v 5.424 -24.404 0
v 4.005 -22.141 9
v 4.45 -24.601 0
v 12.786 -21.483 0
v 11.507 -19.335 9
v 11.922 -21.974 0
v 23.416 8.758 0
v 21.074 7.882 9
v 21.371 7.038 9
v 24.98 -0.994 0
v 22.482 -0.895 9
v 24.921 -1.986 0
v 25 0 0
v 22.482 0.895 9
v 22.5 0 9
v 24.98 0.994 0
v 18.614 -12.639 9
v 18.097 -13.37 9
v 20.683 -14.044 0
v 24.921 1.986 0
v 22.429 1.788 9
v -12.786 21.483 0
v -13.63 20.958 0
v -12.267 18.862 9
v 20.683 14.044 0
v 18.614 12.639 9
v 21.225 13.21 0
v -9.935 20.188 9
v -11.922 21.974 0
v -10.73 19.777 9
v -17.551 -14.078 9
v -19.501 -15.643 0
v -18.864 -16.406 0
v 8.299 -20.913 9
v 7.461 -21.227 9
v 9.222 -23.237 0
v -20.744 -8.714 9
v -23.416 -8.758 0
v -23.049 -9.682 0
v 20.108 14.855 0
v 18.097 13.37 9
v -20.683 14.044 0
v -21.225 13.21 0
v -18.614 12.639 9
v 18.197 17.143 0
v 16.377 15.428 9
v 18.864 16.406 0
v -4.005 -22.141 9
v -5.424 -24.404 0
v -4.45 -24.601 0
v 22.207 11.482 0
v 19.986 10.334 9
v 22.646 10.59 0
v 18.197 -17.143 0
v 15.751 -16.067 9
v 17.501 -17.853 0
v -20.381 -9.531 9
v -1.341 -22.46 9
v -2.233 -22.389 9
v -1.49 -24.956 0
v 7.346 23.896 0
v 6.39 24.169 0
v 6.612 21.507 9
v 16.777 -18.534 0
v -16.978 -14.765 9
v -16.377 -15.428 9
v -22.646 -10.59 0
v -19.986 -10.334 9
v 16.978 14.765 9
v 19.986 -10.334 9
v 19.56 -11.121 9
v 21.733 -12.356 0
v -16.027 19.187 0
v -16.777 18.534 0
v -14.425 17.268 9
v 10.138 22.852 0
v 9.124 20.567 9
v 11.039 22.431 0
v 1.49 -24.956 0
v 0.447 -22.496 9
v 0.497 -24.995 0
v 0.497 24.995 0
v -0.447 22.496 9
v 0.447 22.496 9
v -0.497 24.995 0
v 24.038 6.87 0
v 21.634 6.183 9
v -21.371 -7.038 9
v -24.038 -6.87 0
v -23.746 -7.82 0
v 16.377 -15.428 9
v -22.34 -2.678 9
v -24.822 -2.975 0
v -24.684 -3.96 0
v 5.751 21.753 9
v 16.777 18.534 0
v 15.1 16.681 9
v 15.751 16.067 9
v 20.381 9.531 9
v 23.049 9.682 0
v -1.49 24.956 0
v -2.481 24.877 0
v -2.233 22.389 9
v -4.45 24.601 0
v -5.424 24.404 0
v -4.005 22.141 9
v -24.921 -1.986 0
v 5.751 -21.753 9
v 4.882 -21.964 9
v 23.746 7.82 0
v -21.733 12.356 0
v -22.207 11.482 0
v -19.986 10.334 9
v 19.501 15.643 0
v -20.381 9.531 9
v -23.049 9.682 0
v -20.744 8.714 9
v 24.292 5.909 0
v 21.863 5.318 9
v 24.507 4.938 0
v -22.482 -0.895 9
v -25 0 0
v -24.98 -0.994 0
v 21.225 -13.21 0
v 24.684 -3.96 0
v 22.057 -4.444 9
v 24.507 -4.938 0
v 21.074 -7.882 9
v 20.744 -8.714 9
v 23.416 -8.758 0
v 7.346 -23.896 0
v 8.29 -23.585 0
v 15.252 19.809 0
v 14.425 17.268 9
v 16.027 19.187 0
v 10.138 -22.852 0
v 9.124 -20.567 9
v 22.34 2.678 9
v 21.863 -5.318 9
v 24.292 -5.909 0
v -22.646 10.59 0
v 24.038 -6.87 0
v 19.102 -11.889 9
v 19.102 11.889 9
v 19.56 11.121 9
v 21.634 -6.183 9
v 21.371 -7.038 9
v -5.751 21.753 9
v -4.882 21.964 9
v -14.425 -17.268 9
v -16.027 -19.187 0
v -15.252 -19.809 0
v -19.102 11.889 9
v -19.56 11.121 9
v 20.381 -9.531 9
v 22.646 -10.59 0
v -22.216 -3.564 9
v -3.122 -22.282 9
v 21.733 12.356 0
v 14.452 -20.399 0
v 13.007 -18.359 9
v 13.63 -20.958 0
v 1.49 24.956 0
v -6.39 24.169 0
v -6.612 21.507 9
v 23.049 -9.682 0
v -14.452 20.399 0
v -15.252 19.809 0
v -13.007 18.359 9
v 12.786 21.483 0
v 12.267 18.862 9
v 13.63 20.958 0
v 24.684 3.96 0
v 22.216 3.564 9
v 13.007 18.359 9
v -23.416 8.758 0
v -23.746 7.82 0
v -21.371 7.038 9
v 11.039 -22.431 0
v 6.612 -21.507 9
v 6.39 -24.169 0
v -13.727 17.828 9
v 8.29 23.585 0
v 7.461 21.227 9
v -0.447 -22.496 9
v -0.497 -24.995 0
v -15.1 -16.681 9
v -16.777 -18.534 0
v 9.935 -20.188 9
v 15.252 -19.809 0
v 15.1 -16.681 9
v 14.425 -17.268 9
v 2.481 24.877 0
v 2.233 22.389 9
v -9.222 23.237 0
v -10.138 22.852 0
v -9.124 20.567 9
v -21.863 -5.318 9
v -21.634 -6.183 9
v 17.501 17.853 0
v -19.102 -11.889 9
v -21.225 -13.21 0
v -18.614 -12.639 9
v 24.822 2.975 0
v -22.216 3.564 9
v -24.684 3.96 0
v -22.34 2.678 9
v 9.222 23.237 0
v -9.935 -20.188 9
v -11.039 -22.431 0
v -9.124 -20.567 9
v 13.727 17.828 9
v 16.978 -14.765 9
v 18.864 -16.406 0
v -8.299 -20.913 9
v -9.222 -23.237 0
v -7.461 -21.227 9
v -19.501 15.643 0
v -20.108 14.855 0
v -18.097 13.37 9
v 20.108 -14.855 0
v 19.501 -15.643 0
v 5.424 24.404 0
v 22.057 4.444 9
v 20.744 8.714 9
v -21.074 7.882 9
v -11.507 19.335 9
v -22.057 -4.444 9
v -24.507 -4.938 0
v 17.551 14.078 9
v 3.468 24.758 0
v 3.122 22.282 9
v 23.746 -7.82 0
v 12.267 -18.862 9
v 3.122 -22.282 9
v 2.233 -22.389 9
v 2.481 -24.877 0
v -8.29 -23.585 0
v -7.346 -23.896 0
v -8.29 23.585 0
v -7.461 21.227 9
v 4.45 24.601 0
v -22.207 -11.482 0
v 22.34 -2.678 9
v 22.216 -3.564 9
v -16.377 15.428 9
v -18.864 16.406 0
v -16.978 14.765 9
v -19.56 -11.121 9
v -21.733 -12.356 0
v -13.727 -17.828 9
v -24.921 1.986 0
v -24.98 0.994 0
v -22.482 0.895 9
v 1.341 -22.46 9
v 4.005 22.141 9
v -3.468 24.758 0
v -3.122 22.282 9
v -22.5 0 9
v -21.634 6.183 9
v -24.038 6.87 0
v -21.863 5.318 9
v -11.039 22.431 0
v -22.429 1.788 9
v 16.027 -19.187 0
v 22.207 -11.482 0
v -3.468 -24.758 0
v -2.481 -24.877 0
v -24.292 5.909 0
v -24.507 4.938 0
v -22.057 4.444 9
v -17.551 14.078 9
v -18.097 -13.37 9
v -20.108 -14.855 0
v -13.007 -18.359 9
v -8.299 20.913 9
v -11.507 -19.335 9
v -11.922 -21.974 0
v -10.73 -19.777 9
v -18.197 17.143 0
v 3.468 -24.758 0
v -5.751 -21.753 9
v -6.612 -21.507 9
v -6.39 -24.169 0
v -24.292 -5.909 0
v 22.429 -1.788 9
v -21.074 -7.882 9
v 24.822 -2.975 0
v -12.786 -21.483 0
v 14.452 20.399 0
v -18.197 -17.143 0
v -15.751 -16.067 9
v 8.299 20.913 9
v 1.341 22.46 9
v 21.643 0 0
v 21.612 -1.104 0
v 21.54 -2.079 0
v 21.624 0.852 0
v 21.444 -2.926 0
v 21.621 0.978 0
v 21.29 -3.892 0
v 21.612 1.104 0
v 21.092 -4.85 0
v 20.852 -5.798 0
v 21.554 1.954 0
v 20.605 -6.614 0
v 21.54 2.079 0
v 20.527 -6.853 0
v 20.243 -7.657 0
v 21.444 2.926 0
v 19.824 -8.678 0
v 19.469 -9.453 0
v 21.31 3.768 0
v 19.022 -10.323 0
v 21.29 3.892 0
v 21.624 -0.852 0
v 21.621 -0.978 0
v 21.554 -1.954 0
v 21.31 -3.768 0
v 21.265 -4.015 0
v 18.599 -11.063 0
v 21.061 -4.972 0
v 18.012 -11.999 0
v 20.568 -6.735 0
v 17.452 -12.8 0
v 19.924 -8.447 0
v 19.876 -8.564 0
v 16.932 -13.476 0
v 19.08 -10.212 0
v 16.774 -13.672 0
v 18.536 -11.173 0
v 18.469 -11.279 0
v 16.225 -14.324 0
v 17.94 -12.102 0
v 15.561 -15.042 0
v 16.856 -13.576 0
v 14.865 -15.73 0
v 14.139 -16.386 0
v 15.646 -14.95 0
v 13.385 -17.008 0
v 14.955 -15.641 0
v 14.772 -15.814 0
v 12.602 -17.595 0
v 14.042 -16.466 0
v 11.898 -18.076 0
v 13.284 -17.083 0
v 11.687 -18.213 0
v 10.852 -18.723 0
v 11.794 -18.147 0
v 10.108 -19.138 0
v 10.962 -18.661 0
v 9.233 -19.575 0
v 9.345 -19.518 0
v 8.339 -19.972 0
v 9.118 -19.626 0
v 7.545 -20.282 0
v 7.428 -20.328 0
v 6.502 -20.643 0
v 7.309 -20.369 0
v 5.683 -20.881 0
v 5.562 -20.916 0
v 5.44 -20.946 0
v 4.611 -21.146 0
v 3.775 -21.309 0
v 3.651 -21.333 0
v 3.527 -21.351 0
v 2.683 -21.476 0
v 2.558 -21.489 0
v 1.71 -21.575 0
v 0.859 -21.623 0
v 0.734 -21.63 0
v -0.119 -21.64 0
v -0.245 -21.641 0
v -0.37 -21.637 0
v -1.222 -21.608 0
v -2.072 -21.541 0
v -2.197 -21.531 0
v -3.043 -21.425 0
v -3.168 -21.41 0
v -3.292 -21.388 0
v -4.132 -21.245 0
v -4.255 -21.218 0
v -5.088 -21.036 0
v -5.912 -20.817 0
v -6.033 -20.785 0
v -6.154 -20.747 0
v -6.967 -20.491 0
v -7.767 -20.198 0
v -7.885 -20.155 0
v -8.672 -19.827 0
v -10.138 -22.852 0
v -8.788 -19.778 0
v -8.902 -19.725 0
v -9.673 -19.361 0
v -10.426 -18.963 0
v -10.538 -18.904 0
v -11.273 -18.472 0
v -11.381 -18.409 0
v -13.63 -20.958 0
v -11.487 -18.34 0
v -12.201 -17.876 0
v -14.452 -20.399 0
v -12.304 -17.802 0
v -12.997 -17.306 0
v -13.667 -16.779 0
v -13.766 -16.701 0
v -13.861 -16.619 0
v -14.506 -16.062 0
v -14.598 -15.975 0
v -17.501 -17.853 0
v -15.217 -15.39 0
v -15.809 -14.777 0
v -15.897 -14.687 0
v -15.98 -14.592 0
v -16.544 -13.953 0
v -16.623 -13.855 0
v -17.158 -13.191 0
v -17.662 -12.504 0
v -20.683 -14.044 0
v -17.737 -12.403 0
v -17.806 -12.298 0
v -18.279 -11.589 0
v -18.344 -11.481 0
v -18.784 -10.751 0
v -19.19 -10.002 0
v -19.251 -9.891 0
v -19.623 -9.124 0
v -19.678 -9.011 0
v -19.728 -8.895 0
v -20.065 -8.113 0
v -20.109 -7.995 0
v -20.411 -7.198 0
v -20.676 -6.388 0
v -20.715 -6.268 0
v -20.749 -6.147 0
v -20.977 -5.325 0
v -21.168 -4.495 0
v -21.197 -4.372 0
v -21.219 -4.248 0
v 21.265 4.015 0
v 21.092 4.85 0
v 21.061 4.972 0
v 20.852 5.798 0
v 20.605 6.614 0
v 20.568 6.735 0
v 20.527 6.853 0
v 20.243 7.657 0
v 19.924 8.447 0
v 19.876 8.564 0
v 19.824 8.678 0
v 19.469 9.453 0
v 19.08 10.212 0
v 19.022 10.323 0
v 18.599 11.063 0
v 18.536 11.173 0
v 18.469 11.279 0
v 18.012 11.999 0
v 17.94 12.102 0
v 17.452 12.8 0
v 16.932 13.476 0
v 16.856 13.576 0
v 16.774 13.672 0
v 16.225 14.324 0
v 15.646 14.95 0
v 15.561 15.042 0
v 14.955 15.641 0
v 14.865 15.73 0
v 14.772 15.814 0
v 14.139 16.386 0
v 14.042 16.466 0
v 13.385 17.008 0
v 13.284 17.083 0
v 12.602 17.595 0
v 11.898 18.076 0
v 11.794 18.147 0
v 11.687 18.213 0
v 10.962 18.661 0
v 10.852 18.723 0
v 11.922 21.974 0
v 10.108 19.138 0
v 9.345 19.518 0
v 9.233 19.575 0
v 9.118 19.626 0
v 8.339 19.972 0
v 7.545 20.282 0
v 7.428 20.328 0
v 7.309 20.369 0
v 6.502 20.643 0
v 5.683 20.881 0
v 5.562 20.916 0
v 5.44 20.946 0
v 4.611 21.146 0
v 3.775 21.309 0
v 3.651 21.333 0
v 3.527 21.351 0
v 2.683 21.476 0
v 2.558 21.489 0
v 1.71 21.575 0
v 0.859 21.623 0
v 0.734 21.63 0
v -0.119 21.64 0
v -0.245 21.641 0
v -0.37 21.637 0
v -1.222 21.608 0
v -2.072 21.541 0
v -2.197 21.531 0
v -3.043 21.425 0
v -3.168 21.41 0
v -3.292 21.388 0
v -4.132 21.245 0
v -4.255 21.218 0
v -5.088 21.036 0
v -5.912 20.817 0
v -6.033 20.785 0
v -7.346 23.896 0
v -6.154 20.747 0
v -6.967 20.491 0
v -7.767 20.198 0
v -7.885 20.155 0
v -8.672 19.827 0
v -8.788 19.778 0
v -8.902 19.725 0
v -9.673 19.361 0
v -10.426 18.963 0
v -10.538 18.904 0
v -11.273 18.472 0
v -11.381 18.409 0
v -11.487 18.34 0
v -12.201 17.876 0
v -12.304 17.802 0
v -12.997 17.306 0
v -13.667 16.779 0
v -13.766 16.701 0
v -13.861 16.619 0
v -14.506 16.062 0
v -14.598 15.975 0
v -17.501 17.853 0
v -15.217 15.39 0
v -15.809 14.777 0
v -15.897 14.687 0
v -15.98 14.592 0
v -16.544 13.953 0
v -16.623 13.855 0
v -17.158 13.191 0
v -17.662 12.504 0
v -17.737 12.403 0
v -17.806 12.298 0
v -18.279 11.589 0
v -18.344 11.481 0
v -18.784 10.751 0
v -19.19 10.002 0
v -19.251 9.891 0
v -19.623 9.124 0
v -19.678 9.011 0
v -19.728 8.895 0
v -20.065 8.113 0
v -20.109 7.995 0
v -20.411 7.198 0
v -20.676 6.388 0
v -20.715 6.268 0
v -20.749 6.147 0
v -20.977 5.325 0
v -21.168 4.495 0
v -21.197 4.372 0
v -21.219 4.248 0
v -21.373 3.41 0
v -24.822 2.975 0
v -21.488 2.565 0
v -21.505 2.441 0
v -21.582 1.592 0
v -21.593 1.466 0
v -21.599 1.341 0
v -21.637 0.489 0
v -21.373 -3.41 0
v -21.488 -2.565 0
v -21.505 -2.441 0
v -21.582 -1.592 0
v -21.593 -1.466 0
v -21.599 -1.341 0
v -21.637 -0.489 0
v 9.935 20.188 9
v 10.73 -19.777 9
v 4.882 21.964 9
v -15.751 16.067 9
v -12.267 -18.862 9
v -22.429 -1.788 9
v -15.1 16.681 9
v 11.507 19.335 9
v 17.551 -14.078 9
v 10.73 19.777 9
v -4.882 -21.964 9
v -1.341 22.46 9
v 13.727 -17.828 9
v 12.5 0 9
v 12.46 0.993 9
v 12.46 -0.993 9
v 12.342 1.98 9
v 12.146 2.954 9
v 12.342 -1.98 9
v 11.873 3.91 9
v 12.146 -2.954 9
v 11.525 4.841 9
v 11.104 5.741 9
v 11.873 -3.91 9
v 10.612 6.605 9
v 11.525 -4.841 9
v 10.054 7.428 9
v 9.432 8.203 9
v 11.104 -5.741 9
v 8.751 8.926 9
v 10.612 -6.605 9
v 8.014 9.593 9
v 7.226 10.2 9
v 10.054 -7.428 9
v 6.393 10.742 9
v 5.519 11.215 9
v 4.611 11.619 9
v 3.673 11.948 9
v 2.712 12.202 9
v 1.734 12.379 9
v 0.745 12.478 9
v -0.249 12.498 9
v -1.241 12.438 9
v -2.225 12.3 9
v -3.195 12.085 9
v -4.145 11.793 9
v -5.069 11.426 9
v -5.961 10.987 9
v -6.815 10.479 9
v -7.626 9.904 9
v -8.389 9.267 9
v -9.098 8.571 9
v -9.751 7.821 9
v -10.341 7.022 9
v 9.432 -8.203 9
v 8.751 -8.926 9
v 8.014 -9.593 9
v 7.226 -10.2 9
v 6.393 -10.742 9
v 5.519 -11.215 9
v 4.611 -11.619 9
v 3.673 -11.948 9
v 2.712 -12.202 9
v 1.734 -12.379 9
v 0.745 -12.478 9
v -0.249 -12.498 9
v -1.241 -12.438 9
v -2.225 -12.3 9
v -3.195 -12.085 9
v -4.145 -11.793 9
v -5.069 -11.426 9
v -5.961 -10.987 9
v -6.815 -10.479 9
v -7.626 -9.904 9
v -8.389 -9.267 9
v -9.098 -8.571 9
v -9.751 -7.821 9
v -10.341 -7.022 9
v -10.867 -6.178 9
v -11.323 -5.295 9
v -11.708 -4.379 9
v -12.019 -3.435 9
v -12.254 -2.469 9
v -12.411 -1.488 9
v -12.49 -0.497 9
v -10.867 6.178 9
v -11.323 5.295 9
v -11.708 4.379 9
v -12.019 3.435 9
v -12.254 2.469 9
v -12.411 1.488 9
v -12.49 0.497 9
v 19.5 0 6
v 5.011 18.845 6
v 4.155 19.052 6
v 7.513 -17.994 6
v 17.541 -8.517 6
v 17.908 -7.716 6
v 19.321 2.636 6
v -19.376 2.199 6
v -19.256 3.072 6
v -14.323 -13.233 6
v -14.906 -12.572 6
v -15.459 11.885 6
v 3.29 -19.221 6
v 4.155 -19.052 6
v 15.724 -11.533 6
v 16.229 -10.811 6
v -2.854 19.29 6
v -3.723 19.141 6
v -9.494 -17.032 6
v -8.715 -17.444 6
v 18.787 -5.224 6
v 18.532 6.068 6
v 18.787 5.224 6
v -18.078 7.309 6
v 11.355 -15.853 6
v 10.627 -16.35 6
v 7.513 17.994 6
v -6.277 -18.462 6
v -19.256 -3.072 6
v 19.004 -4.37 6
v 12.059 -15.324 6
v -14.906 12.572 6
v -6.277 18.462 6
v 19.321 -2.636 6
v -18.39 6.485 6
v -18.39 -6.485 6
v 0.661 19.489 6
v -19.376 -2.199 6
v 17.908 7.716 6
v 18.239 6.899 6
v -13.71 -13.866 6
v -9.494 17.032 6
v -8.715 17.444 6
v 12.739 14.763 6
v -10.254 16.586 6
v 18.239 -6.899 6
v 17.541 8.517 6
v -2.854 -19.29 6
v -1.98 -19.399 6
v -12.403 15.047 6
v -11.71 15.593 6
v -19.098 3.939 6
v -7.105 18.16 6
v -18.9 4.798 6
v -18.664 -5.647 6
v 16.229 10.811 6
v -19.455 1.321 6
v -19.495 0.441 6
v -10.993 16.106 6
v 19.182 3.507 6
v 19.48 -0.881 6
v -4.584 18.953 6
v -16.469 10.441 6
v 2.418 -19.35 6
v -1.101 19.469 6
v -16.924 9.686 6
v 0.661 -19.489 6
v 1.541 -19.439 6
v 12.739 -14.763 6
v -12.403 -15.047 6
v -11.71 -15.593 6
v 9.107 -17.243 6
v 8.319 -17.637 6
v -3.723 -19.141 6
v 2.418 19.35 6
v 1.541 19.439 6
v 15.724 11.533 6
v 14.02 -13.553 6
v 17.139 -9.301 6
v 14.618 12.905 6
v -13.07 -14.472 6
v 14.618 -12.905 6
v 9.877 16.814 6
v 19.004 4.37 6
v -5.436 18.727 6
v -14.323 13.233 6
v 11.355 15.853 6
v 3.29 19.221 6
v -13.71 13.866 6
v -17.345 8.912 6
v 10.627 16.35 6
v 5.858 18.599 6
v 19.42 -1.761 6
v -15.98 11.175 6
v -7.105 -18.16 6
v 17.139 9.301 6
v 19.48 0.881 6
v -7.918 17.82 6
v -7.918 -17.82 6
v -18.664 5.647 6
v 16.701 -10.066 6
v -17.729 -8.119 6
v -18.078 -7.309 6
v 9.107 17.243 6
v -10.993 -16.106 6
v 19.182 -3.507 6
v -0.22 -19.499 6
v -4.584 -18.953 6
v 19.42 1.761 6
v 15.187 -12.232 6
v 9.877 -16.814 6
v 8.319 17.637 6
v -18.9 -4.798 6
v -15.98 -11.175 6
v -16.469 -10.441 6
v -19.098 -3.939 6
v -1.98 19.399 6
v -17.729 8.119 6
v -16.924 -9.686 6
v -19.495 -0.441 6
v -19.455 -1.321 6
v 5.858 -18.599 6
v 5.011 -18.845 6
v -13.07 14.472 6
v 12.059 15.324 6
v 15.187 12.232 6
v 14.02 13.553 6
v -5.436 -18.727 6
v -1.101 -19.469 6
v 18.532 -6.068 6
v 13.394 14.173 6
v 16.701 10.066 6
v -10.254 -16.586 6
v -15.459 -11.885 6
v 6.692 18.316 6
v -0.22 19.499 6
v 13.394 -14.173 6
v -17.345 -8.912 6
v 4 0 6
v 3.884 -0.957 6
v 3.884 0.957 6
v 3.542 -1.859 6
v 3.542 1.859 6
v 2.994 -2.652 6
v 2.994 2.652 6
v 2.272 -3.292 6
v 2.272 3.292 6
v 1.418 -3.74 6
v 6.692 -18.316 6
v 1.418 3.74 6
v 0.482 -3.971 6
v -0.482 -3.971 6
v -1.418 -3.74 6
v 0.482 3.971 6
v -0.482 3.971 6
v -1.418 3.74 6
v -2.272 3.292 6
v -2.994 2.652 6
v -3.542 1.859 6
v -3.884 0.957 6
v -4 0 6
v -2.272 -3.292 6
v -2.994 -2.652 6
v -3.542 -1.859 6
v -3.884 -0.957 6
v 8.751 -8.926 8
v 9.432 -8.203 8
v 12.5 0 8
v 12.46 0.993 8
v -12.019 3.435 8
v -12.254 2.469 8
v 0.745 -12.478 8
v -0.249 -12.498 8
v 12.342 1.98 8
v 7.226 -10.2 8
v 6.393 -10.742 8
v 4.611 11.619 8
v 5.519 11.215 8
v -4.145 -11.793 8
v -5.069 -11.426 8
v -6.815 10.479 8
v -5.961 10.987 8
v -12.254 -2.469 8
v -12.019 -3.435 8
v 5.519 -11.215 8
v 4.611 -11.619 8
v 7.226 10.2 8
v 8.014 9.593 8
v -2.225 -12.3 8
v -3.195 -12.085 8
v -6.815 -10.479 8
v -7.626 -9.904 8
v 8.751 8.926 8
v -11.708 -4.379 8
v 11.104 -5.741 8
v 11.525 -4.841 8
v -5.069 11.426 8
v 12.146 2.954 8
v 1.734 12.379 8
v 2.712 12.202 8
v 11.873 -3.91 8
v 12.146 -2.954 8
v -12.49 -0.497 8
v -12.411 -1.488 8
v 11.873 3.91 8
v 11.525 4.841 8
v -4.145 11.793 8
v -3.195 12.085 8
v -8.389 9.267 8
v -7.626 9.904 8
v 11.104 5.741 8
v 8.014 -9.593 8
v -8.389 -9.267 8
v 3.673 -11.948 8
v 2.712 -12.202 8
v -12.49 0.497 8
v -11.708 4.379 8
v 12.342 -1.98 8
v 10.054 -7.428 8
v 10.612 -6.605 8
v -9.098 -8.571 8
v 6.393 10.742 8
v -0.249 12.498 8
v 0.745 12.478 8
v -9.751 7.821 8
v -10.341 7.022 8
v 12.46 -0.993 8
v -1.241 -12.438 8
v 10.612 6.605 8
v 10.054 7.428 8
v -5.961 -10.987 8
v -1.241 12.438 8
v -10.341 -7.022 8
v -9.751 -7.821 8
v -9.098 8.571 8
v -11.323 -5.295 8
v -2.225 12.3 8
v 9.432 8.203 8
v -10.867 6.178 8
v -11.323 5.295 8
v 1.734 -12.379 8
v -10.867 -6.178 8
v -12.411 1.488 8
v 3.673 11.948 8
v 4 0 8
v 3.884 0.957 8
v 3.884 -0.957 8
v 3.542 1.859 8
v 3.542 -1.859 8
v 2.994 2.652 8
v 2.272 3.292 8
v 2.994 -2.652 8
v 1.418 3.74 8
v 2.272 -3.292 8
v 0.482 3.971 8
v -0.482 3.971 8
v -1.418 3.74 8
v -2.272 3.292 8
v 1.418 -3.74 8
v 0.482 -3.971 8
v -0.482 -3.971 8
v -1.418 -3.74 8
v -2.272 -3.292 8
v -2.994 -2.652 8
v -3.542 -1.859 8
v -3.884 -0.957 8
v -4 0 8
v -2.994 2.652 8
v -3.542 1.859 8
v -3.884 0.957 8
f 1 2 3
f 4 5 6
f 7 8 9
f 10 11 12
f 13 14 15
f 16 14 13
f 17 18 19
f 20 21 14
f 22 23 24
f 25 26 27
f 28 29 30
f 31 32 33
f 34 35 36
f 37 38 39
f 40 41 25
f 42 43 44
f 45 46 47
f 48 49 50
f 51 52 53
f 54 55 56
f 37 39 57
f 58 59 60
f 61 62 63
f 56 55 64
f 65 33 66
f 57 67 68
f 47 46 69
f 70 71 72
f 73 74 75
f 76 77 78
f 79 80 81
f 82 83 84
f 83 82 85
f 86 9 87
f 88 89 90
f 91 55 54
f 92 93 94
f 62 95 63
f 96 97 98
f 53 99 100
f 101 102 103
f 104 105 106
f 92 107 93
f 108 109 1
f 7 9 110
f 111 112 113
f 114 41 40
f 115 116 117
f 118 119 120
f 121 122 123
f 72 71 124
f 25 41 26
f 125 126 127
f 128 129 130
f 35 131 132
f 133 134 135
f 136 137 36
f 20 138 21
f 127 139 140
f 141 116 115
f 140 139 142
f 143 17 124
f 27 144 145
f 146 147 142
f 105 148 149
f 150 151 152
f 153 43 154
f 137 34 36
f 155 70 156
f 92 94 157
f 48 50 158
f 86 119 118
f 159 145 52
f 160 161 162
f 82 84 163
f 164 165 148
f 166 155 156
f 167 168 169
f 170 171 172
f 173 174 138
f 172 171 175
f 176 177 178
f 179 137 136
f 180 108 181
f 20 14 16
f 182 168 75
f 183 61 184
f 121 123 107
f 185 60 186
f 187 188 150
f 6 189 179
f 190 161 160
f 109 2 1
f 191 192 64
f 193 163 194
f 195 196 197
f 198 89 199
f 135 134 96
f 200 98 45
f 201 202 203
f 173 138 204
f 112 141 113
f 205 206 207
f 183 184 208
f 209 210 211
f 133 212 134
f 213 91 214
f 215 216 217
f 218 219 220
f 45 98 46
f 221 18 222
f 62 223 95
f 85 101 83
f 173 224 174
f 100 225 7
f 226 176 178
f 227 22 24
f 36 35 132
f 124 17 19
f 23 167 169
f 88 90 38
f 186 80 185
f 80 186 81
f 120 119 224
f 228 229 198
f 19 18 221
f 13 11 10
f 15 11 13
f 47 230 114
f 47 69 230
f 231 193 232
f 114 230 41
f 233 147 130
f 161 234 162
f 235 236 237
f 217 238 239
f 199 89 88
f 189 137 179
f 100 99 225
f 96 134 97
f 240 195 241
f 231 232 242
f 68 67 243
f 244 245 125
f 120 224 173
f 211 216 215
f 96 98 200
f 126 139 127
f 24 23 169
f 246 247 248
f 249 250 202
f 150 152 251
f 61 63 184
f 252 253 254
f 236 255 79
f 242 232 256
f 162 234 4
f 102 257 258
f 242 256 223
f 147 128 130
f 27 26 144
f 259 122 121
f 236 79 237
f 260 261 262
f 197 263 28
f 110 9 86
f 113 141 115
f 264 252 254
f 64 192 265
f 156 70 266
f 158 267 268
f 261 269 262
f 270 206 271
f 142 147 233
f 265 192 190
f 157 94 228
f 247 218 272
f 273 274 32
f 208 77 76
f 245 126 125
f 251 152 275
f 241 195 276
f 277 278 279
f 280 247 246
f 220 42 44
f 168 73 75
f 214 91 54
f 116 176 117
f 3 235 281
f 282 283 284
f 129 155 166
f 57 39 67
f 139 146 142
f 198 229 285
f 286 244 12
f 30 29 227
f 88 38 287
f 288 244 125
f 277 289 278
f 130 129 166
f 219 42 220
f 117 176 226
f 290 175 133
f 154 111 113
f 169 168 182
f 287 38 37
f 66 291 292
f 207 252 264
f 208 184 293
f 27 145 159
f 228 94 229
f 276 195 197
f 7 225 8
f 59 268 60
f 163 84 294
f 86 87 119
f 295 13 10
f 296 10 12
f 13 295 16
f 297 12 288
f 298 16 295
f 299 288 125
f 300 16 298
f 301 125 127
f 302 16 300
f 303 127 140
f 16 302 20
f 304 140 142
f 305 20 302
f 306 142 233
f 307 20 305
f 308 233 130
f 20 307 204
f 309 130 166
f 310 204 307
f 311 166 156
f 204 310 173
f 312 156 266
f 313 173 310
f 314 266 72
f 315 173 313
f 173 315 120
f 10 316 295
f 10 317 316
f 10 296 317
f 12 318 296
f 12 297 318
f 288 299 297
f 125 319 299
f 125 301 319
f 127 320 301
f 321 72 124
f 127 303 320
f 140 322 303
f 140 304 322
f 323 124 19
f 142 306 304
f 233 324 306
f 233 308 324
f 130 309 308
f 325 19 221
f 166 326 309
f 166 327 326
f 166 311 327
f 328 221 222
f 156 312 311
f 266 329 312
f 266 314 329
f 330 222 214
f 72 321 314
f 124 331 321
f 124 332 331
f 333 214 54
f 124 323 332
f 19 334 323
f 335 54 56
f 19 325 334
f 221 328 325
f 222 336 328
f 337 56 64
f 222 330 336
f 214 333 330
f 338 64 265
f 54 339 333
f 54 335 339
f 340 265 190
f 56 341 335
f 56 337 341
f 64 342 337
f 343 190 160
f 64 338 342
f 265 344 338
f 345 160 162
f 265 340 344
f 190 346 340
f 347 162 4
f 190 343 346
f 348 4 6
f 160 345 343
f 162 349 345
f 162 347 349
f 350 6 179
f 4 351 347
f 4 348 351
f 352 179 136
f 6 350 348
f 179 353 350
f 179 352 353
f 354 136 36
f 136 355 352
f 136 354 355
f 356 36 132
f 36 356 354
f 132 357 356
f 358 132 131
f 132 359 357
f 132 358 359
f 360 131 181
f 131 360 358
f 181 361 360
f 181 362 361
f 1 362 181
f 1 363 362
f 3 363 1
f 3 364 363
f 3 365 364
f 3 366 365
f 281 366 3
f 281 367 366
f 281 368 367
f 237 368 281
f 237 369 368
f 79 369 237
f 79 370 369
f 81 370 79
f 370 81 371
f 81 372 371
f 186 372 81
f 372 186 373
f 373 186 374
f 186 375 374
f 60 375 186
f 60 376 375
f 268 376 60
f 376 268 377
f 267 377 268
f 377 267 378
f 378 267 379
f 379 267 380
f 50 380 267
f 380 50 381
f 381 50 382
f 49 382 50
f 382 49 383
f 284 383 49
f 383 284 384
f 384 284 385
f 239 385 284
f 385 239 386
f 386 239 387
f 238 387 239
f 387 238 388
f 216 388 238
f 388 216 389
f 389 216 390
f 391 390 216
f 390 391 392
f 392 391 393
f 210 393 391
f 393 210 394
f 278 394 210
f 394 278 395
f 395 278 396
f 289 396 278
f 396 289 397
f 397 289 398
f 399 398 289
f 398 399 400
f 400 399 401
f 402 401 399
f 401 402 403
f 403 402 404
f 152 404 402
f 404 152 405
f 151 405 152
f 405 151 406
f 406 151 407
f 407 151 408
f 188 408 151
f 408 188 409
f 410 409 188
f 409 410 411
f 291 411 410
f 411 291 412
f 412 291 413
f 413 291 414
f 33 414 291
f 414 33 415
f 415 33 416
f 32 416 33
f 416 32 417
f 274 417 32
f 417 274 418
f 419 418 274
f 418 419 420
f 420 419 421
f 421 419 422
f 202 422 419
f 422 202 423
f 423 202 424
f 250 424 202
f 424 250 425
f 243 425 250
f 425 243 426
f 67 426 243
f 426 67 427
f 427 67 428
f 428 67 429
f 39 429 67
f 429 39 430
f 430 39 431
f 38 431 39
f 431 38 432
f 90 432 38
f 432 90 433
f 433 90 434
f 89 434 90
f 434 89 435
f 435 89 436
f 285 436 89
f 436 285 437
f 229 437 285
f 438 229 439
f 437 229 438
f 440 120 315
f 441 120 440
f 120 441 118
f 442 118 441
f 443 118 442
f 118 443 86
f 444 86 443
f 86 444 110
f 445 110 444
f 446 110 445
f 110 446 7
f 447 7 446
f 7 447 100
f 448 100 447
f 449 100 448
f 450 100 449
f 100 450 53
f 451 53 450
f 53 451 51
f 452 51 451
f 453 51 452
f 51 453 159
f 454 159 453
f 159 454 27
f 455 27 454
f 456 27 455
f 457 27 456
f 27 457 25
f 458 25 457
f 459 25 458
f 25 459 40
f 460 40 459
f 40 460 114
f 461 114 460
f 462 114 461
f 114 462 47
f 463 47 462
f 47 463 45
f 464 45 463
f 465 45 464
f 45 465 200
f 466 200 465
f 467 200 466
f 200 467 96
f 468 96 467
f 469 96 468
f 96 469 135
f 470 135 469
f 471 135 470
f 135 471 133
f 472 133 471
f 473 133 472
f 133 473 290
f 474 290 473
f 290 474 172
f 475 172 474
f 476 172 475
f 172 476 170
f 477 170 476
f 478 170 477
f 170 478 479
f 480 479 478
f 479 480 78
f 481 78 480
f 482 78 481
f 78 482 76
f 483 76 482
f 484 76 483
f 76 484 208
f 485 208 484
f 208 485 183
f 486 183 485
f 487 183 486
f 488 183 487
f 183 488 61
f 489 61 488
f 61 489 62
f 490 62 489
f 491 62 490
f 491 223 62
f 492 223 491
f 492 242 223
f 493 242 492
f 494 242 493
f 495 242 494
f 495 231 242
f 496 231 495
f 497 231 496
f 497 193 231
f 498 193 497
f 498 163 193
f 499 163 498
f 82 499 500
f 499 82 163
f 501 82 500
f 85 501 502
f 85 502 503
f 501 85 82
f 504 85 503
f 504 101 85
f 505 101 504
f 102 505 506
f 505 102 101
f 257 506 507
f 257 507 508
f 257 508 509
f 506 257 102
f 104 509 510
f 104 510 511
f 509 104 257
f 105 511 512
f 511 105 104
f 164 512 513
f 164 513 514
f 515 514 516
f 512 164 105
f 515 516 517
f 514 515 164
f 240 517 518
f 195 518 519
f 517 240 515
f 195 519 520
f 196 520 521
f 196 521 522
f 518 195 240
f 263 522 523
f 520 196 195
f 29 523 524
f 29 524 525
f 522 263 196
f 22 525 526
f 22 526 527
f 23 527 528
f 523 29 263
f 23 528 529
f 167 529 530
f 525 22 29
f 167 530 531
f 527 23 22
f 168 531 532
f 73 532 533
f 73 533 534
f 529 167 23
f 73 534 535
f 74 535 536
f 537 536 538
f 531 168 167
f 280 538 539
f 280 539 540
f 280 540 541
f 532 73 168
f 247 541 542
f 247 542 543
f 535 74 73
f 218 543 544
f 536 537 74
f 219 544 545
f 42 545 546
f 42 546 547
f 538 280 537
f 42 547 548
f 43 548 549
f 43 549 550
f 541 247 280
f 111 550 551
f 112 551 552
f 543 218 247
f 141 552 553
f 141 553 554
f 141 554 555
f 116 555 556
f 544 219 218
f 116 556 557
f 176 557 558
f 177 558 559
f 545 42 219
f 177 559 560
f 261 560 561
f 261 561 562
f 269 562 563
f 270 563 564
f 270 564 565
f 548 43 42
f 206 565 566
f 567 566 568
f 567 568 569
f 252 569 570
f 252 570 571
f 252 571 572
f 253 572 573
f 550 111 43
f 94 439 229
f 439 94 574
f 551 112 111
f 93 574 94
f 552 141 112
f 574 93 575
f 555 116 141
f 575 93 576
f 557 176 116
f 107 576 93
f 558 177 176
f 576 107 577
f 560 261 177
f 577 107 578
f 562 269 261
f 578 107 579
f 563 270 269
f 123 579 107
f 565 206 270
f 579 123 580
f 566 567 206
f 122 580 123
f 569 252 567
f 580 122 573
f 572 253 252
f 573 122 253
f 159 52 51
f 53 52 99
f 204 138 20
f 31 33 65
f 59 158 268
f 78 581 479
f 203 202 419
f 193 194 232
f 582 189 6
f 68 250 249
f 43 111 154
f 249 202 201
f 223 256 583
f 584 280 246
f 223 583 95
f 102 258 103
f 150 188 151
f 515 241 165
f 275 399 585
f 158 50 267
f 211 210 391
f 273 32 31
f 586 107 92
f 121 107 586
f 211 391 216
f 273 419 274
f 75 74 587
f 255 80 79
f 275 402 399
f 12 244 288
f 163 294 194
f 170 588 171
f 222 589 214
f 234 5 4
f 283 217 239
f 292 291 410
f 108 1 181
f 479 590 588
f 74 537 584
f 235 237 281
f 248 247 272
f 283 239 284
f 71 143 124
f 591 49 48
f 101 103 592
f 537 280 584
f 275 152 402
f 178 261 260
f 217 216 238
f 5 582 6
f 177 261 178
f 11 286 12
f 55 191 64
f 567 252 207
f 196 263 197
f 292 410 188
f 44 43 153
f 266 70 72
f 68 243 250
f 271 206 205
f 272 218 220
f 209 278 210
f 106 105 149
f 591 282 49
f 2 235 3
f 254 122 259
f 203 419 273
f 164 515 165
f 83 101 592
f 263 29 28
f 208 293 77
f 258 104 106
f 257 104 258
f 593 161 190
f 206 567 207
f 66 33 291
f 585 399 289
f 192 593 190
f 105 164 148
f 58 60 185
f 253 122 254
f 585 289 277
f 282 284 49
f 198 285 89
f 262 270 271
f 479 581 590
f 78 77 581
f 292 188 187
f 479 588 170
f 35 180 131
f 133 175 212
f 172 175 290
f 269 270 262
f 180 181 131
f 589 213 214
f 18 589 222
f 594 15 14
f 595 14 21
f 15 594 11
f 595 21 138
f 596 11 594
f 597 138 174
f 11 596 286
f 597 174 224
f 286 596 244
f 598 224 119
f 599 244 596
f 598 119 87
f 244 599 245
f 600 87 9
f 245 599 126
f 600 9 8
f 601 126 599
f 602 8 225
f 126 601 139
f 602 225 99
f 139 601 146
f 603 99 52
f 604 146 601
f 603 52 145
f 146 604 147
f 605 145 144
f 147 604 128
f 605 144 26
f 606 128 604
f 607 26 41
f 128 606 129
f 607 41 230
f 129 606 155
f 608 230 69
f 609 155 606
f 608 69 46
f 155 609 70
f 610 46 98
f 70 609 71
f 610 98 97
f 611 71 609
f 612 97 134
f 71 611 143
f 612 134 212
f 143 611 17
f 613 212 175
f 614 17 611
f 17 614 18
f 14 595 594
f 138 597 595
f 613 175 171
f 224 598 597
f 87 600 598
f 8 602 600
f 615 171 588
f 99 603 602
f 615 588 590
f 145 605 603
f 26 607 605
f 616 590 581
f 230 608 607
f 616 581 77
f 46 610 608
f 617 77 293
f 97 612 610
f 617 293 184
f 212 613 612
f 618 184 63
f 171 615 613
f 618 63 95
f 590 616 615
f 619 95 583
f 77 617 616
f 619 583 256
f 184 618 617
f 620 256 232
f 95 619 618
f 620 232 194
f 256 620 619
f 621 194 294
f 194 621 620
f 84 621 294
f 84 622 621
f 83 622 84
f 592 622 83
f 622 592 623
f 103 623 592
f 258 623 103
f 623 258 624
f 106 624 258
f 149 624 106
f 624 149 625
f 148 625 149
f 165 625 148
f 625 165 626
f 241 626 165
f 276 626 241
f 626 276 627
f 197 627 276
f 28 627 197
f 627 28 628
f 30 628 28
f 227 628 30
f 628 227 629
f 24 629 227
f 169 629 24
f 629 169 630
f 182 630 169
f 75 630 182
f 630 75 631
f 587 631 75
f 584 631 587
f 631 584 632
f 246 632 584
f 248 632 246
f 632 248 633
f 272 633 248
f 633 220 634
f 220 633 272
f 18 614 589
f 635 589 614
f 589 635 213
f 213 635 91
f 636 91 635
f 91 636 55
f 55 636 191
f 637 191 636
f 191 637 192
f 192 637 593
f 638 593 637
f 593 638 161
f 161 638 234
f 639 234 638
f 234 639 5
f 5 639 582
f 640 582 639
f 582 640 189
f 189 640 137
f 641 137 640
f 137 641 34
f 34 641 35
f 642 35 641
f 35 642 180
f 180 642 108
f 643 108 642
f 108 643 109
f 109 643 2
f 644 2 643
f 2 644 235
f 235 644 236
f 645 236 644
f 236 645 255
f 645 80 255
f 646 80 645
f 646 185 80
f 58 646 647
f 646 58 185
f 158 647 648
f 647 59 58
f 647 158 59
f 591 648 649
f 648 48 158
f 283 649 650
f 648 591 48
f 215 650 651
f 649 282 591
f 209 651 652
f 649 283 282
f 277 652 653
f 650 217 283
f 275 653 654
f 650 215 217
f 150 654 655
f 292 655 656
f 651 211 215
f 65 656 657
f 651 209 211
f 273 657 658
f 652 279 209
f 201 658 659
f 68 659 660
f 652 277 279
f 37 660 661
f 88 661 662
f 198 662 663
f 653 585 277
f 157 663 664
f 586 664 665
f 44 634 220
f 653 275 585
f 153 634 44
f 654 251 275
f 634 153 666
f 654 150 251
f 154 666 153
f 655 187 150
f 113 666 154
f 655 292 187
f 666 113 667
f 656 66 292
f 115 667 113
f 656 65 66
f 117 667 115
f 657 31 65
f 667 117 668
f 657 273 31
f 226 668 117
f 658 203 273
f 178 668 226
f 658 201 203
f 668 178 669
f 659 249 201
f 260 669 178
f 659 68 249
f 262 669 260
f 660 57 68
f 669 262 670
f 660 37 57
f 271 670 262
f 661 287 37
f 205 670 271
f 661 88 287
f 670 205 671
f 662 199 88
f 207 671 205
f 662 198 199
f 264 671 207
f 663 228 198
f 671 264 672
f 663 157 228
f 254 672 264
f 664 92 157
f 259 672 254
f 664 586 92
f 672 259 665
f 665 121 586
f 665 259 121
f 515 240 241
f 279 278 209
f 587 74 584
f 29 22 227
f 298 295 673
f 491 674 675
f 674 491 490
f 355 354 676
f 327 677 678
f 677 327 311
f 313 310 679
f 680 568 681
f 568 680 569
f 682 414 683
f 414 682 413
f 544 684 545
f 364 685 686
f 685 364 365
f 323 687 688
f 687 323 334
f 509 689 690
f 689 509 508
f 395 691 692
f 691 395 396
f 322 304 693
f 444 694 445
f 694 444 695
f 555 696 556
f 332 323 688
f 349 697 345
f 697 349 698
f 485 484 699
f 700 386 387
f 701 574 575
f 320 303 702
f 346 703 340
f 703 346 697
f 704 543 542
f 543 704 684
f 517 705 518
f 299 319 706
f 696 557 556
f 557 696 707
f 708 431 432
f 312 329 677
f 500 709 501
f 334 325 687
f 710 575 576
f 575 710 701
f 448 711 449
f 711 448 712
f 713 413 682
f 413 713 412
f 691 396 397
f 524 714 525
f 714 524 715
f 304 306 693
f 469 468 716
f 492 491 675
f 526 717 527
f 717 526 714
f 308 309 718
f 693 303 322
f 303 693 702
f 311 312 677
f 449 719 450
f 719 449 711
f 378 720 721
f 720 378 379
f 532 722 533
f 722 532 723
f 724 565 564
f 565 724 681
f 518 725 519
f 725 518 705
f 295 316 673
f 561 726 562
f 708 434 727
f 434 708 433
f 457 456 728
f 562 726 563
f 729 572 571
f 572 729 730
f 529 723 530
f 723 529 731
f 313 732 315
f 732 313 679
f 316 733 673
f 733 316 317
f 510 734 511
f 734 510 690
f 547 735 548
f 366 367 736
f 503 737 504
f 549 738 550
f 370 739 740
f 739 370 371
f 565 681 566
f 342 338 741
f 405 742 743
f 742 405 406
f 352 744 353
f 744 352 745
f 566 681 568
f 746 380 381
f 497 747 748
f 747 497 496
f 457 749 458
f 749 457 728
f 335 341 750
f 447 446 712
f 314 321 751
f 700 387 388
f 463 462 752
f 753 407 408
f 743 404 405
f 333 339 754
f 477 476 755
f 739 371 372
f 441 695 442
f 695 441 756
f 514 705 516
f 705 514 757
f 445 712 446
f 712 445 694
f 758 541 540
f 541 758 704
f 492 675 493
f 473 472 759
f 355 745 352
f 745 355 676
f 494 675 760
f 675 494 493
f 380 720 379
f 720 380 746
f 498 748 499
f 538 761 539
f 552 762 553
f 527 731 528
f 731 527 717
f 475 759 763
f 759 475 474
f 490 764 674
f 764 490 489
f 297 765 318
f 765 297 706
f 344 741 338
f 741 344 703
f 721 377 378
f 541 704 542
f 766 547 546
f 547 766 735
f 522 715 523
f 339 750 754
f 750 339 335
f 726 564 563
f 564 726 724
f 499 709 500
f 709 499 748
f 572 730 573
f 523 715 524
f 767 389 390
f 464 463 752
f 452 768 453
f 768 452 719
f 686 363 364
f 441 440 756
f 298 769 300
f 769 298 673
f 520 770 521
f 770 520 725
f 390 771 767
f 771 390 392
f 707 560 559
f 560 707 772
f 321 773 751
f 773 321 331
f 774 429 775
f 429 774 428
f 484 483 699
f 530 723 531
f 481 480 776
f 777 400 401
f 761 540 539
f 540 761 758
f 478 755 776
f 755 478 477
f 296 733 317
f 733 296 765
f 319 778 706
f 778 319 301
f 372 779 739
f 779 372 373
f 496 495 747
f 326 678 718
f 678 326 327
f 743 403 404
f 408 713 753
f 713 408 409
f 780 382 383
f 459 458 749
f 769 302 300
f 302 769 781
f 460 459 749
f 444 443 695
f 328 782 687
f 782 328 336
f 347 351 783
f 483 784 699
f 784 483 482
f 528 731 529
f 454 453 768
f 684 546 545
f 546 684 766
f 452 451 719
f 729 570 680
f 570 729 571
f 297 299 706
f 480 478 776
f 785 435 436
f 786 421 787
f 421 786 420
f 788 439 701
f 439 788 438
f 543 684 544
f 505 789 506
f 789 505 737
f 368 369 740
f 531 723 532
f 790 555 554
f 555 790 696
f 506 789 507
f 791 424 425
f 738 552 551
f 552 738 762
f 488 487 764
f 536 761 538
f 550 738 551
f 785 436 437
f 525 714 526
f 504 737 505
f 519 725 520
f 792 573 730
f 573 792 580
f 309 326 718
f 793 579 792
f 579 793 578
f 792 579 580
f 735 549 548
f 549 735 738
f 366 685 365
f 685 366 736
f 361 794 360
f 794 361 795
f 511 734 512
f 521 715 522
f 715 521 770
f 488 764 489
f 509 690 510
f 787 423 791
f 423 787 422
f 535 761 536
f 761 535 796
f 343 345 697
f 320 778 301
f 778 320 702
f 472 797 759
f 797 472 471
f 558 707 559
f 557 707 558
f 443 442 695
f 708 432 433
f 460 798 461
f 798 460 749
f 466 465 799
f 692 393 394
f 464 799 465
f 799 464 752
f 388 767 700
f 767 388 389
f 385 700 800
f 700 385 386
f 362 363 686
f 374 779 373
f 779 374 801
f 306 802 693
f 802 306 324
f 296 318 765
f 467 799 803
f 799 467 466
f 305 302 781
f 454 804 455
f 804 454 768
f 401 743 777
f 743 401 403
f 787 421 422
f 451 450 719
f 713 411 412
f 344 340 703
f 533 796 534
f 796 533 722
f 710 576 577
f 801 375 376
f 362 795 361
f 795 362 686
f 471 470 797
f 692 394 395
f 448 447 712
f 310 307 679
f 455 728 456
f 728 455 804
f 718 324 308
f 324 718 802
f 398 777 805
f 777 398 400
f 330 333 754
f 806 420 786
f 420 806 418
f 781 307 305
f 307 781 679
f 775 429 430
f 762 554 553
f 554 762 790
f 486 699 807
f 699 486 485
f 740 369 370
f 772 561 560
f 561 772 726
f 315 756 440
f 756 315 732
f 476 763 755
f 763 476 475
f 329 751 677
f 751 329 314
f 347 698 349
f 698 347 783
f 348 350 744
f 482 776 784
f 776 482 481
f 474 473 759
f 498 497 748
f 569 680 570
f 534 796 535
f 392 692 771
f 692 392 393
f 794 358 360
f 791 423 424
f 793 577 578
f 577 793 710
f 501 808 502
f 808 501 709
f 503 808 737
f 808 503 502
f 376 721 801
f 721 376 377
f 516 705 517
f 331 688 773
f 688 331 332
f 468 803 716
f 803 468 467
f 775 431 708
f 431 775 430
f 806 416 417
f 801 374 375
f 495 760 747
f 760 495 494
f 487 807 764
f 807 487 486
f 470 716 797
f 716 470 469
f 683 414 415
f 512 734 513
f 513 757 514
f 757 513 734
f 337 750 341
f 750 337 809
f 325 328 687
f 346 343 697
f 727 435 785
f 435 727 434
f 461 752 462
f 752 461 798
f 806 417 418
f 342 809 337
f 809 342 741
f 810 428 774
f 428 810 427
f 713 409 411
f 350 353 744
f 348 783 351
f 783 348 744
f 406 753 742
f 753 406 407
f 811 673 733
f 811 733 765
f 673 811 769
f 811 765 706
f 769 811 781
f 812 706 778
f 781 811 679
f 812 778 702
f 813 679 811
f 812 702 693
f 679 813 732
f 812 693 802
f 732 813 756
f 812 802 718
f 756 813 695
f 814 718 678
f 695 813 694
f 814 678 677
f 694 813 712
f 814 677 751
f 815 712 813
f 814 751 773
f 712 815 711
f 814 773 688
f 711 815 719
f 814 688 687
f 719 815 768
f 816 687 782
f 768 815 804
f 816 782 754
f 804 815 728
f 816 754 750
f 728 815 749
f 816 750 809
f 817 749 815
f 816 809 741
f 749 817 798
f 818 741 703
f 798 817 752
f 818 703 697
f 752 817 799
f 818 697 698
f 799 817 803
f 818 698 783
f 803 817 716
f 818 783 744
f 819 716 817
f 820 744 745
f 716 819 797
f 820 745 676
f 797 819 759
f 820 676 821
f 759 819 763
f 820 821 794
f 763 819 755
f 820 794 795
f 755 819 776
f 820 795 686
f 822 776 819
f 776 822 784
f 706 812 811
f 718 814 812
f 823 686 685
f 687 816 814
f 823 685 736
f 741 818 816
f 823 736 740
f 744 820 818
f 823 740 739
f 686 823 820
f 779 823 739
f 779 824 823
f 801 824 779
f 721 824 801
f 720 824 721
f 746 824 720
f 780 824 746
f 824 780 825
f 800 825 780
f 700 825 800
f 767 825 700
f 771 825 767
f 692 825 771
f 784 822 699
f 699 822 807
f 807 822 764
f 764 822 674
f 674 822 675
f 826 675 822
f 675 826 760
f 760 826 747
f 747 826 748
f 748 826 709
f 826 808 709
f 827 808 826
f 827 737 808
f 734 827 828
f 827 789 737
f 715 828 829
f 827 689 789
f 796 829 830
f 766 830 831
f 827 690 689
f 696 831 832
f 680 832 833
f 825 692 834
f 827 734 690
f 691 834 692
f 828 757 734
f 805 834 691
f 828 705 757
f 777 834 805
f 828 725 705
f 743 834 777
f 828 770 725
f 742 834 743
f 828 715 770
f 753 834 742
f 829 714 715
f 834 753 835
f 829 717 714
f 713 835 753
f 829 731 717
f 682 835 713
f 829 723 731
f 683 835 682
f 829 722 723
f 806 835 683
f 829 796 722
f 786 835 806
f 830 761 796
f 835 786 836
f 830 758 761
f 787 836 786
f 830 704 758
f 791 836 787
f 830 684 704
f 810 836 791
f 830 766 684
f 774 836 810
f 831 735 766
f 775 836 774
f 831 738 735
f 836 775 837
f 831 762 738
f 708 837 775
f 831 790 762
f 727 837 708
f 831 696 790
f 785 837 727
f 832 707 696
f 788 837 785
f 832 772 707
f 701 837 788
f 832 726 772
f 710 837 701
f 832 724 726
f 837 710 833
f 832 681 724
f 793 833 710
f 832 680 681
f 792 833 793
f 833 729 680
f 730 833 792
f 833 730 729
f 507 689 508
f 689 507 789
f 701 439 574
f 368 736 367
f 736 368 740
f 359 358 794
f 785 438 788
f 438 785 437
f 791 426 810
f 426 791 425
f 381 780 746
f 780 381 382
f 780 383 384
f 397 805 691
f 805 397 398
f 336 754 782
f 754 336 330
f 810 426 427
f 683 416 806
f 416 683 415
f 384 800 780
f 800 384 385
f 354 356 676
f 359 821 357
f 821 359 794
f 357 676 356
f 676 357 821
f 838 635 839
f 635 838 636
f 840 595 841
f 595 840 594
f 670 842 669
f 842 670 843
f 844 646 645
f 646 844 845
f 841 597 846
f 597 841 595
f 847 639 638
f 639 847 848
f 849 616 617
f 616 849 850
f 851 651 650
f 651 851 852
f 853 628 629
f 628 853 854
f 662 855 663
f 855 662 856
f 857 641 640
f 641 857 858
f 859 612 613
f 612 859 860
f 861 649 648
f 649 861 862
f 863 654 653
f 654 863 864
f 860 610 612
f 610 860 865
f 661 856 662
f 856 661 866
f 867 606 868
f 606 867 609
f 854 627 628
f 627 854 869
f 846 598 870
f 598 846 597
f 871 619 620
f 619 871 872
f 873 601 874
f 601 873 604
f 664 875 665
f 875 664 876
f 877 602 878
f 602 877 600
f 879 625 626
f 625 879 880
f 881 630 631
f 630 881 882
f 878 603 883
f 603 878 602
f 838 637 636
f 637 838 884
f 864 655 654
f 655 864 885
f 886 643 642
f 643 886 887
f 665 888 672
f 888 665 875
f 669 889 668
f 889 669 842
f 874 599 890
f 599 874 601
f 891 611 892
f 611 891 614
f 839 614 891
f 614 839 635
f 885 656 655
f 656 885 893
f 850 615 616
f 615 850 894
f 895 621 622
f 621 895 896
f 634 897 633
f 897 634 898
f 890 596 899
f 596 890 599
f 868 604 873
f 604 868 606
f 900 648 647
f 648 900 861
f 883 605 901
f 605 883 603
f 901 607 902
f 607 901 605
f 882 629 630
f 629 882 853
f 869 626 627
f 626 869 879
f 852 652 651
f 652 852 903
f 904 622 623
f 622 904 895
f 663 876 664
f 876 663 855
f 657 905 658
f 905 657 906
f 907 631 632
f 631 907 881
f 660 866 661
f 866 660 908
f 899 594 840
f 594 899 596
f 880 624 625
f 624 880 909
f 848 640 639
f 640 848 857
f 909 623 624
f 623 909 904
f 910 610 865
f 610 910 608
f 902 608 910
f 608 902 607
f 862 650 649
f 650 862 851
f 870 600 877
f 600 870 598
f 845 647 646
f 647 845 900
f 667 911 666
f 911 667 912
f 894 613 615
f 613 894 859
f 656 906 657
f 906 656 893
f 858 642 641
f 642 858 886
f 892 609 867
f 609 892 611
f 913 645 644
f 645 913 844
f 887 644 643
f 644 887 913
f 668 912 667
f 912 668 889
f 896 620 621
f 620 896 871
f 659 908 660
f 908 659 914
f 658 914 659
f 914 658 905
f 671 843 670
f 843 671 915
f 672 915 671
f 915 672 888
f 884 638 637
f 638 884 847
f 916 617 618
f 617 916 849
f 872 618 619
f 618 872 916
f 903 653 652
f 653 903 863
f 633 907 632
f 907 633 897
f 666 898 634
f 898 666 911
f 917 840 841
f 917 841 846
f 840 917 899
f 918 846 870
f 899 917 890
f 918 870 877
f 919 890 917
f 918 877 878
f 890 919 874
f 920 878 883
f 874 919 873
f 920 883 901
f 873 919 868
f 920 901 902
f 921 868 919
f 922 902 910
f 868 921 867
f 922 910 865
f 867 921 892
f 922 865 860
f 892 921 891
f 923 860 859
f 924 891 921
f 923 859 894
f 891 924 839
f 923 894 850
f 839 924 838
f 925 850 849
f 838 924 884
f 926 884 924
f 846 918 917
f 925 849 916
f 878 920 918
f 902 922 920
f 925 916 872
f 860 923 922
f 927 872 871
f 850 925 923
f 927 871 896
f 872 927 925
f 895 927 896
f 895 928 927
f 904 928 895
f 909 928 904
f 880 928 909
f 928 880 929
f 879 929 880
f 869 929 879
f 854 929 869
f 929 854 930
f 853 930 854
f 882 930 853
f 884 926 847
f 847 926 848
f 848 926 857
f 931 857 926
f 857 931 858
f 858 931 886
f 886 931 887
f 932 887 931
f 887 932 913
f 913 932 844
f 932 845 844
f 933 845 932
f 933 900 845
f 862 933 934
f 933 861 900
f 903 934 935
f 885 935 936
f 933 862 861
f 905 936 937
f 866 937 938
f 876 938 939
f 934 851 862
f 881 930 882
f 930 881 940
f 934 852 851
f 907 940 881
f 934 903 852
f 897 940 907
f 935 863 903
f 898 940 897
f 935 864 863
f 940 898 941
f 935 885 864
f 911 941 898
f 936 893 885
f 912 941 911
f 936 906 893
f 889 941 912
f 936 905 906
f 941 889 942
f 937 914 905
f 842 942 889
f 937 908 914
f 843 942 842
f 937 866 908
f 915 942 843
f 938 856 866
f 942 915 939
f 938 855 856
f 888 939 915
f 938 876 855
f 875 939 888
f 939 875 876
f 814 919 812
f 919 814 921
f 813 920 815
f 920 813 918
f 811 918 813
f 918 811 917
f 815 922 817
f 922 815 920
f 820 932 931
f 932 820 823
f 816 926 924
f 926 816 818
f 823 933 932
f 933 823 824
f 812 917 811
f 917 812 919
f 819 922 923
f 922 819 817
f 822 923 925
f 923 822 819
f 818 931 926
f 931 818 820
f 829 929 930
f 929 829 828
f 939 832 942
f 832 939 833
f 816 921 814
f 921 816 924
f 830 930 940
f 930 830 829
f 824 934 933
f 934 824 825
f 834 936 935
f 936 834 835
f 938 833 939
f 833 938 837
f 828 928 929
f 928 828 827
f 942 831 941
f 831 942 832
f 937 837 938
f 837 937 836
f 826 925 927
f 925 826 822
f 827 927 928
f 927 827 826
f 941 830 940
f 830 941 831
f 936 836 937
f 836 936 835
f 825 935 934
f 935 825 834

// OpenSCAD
// Button soccer player (gombfoci) - 1.0
// by György Balássy 2016 (http://gyorgybalassy.wordpress.com)
// http://www.thingiverse.com/thing:1359651

// The diameter of the bottom ring in millimeters.
bottomDiameter = 50;

// The diameter of the top ring in millimeters.
topDiameter = 45;

// The total height of the player in millimeters.
height = 9; 

// The wall thickness in millimeters.
thickness=3;

/* [Hidden] */

$fa=1;   // Default minimum facet angle.
$fs=1;   // Default minimum facet size.
delta=1; // Ensures that no faces remains after boolean operations.

labelDiameter = 25;
labelDepth = 1;
holeDiameter = 8;

mainColor = [0.117, 0.565, 1];  // DodgerBlue: RGB(30, 144, 255)
highlightColor = [0.384, 0.726, 1]; // Lighter DodgerBlue: RGB(98, 185, 255)

echo(str("Drawing a ", bottomDiameter, "×", topDiameter, "×", height, " player..."));

difference()
{
  // Draw the outer shell.
  color(mainColor)
    cylinder(d1 = bottomDiameter, 
             d2 = topDiameter, 
              h = height);
  
  // Subtract the main body from the bottom.
  color(highlightColor)
    translate([0, 0, -delta])
      cylinder(d1 = bottomDiameter - 2 * thickness, 
               d2 = topDiameter - 2 * thickness, 
                h = height - thickness + delta);
  
  // Subtract the round shape for the label from the top.
  color(highlightColor)
    translate([0, 0, height - labelDepth])
      cylinder(d = labelDiameter,
               h = labelDepth + delta);
  
  // Drill the hole.
  color(highlightColor)
    cylinder(d = holeDiameter,
             h = height);
}
